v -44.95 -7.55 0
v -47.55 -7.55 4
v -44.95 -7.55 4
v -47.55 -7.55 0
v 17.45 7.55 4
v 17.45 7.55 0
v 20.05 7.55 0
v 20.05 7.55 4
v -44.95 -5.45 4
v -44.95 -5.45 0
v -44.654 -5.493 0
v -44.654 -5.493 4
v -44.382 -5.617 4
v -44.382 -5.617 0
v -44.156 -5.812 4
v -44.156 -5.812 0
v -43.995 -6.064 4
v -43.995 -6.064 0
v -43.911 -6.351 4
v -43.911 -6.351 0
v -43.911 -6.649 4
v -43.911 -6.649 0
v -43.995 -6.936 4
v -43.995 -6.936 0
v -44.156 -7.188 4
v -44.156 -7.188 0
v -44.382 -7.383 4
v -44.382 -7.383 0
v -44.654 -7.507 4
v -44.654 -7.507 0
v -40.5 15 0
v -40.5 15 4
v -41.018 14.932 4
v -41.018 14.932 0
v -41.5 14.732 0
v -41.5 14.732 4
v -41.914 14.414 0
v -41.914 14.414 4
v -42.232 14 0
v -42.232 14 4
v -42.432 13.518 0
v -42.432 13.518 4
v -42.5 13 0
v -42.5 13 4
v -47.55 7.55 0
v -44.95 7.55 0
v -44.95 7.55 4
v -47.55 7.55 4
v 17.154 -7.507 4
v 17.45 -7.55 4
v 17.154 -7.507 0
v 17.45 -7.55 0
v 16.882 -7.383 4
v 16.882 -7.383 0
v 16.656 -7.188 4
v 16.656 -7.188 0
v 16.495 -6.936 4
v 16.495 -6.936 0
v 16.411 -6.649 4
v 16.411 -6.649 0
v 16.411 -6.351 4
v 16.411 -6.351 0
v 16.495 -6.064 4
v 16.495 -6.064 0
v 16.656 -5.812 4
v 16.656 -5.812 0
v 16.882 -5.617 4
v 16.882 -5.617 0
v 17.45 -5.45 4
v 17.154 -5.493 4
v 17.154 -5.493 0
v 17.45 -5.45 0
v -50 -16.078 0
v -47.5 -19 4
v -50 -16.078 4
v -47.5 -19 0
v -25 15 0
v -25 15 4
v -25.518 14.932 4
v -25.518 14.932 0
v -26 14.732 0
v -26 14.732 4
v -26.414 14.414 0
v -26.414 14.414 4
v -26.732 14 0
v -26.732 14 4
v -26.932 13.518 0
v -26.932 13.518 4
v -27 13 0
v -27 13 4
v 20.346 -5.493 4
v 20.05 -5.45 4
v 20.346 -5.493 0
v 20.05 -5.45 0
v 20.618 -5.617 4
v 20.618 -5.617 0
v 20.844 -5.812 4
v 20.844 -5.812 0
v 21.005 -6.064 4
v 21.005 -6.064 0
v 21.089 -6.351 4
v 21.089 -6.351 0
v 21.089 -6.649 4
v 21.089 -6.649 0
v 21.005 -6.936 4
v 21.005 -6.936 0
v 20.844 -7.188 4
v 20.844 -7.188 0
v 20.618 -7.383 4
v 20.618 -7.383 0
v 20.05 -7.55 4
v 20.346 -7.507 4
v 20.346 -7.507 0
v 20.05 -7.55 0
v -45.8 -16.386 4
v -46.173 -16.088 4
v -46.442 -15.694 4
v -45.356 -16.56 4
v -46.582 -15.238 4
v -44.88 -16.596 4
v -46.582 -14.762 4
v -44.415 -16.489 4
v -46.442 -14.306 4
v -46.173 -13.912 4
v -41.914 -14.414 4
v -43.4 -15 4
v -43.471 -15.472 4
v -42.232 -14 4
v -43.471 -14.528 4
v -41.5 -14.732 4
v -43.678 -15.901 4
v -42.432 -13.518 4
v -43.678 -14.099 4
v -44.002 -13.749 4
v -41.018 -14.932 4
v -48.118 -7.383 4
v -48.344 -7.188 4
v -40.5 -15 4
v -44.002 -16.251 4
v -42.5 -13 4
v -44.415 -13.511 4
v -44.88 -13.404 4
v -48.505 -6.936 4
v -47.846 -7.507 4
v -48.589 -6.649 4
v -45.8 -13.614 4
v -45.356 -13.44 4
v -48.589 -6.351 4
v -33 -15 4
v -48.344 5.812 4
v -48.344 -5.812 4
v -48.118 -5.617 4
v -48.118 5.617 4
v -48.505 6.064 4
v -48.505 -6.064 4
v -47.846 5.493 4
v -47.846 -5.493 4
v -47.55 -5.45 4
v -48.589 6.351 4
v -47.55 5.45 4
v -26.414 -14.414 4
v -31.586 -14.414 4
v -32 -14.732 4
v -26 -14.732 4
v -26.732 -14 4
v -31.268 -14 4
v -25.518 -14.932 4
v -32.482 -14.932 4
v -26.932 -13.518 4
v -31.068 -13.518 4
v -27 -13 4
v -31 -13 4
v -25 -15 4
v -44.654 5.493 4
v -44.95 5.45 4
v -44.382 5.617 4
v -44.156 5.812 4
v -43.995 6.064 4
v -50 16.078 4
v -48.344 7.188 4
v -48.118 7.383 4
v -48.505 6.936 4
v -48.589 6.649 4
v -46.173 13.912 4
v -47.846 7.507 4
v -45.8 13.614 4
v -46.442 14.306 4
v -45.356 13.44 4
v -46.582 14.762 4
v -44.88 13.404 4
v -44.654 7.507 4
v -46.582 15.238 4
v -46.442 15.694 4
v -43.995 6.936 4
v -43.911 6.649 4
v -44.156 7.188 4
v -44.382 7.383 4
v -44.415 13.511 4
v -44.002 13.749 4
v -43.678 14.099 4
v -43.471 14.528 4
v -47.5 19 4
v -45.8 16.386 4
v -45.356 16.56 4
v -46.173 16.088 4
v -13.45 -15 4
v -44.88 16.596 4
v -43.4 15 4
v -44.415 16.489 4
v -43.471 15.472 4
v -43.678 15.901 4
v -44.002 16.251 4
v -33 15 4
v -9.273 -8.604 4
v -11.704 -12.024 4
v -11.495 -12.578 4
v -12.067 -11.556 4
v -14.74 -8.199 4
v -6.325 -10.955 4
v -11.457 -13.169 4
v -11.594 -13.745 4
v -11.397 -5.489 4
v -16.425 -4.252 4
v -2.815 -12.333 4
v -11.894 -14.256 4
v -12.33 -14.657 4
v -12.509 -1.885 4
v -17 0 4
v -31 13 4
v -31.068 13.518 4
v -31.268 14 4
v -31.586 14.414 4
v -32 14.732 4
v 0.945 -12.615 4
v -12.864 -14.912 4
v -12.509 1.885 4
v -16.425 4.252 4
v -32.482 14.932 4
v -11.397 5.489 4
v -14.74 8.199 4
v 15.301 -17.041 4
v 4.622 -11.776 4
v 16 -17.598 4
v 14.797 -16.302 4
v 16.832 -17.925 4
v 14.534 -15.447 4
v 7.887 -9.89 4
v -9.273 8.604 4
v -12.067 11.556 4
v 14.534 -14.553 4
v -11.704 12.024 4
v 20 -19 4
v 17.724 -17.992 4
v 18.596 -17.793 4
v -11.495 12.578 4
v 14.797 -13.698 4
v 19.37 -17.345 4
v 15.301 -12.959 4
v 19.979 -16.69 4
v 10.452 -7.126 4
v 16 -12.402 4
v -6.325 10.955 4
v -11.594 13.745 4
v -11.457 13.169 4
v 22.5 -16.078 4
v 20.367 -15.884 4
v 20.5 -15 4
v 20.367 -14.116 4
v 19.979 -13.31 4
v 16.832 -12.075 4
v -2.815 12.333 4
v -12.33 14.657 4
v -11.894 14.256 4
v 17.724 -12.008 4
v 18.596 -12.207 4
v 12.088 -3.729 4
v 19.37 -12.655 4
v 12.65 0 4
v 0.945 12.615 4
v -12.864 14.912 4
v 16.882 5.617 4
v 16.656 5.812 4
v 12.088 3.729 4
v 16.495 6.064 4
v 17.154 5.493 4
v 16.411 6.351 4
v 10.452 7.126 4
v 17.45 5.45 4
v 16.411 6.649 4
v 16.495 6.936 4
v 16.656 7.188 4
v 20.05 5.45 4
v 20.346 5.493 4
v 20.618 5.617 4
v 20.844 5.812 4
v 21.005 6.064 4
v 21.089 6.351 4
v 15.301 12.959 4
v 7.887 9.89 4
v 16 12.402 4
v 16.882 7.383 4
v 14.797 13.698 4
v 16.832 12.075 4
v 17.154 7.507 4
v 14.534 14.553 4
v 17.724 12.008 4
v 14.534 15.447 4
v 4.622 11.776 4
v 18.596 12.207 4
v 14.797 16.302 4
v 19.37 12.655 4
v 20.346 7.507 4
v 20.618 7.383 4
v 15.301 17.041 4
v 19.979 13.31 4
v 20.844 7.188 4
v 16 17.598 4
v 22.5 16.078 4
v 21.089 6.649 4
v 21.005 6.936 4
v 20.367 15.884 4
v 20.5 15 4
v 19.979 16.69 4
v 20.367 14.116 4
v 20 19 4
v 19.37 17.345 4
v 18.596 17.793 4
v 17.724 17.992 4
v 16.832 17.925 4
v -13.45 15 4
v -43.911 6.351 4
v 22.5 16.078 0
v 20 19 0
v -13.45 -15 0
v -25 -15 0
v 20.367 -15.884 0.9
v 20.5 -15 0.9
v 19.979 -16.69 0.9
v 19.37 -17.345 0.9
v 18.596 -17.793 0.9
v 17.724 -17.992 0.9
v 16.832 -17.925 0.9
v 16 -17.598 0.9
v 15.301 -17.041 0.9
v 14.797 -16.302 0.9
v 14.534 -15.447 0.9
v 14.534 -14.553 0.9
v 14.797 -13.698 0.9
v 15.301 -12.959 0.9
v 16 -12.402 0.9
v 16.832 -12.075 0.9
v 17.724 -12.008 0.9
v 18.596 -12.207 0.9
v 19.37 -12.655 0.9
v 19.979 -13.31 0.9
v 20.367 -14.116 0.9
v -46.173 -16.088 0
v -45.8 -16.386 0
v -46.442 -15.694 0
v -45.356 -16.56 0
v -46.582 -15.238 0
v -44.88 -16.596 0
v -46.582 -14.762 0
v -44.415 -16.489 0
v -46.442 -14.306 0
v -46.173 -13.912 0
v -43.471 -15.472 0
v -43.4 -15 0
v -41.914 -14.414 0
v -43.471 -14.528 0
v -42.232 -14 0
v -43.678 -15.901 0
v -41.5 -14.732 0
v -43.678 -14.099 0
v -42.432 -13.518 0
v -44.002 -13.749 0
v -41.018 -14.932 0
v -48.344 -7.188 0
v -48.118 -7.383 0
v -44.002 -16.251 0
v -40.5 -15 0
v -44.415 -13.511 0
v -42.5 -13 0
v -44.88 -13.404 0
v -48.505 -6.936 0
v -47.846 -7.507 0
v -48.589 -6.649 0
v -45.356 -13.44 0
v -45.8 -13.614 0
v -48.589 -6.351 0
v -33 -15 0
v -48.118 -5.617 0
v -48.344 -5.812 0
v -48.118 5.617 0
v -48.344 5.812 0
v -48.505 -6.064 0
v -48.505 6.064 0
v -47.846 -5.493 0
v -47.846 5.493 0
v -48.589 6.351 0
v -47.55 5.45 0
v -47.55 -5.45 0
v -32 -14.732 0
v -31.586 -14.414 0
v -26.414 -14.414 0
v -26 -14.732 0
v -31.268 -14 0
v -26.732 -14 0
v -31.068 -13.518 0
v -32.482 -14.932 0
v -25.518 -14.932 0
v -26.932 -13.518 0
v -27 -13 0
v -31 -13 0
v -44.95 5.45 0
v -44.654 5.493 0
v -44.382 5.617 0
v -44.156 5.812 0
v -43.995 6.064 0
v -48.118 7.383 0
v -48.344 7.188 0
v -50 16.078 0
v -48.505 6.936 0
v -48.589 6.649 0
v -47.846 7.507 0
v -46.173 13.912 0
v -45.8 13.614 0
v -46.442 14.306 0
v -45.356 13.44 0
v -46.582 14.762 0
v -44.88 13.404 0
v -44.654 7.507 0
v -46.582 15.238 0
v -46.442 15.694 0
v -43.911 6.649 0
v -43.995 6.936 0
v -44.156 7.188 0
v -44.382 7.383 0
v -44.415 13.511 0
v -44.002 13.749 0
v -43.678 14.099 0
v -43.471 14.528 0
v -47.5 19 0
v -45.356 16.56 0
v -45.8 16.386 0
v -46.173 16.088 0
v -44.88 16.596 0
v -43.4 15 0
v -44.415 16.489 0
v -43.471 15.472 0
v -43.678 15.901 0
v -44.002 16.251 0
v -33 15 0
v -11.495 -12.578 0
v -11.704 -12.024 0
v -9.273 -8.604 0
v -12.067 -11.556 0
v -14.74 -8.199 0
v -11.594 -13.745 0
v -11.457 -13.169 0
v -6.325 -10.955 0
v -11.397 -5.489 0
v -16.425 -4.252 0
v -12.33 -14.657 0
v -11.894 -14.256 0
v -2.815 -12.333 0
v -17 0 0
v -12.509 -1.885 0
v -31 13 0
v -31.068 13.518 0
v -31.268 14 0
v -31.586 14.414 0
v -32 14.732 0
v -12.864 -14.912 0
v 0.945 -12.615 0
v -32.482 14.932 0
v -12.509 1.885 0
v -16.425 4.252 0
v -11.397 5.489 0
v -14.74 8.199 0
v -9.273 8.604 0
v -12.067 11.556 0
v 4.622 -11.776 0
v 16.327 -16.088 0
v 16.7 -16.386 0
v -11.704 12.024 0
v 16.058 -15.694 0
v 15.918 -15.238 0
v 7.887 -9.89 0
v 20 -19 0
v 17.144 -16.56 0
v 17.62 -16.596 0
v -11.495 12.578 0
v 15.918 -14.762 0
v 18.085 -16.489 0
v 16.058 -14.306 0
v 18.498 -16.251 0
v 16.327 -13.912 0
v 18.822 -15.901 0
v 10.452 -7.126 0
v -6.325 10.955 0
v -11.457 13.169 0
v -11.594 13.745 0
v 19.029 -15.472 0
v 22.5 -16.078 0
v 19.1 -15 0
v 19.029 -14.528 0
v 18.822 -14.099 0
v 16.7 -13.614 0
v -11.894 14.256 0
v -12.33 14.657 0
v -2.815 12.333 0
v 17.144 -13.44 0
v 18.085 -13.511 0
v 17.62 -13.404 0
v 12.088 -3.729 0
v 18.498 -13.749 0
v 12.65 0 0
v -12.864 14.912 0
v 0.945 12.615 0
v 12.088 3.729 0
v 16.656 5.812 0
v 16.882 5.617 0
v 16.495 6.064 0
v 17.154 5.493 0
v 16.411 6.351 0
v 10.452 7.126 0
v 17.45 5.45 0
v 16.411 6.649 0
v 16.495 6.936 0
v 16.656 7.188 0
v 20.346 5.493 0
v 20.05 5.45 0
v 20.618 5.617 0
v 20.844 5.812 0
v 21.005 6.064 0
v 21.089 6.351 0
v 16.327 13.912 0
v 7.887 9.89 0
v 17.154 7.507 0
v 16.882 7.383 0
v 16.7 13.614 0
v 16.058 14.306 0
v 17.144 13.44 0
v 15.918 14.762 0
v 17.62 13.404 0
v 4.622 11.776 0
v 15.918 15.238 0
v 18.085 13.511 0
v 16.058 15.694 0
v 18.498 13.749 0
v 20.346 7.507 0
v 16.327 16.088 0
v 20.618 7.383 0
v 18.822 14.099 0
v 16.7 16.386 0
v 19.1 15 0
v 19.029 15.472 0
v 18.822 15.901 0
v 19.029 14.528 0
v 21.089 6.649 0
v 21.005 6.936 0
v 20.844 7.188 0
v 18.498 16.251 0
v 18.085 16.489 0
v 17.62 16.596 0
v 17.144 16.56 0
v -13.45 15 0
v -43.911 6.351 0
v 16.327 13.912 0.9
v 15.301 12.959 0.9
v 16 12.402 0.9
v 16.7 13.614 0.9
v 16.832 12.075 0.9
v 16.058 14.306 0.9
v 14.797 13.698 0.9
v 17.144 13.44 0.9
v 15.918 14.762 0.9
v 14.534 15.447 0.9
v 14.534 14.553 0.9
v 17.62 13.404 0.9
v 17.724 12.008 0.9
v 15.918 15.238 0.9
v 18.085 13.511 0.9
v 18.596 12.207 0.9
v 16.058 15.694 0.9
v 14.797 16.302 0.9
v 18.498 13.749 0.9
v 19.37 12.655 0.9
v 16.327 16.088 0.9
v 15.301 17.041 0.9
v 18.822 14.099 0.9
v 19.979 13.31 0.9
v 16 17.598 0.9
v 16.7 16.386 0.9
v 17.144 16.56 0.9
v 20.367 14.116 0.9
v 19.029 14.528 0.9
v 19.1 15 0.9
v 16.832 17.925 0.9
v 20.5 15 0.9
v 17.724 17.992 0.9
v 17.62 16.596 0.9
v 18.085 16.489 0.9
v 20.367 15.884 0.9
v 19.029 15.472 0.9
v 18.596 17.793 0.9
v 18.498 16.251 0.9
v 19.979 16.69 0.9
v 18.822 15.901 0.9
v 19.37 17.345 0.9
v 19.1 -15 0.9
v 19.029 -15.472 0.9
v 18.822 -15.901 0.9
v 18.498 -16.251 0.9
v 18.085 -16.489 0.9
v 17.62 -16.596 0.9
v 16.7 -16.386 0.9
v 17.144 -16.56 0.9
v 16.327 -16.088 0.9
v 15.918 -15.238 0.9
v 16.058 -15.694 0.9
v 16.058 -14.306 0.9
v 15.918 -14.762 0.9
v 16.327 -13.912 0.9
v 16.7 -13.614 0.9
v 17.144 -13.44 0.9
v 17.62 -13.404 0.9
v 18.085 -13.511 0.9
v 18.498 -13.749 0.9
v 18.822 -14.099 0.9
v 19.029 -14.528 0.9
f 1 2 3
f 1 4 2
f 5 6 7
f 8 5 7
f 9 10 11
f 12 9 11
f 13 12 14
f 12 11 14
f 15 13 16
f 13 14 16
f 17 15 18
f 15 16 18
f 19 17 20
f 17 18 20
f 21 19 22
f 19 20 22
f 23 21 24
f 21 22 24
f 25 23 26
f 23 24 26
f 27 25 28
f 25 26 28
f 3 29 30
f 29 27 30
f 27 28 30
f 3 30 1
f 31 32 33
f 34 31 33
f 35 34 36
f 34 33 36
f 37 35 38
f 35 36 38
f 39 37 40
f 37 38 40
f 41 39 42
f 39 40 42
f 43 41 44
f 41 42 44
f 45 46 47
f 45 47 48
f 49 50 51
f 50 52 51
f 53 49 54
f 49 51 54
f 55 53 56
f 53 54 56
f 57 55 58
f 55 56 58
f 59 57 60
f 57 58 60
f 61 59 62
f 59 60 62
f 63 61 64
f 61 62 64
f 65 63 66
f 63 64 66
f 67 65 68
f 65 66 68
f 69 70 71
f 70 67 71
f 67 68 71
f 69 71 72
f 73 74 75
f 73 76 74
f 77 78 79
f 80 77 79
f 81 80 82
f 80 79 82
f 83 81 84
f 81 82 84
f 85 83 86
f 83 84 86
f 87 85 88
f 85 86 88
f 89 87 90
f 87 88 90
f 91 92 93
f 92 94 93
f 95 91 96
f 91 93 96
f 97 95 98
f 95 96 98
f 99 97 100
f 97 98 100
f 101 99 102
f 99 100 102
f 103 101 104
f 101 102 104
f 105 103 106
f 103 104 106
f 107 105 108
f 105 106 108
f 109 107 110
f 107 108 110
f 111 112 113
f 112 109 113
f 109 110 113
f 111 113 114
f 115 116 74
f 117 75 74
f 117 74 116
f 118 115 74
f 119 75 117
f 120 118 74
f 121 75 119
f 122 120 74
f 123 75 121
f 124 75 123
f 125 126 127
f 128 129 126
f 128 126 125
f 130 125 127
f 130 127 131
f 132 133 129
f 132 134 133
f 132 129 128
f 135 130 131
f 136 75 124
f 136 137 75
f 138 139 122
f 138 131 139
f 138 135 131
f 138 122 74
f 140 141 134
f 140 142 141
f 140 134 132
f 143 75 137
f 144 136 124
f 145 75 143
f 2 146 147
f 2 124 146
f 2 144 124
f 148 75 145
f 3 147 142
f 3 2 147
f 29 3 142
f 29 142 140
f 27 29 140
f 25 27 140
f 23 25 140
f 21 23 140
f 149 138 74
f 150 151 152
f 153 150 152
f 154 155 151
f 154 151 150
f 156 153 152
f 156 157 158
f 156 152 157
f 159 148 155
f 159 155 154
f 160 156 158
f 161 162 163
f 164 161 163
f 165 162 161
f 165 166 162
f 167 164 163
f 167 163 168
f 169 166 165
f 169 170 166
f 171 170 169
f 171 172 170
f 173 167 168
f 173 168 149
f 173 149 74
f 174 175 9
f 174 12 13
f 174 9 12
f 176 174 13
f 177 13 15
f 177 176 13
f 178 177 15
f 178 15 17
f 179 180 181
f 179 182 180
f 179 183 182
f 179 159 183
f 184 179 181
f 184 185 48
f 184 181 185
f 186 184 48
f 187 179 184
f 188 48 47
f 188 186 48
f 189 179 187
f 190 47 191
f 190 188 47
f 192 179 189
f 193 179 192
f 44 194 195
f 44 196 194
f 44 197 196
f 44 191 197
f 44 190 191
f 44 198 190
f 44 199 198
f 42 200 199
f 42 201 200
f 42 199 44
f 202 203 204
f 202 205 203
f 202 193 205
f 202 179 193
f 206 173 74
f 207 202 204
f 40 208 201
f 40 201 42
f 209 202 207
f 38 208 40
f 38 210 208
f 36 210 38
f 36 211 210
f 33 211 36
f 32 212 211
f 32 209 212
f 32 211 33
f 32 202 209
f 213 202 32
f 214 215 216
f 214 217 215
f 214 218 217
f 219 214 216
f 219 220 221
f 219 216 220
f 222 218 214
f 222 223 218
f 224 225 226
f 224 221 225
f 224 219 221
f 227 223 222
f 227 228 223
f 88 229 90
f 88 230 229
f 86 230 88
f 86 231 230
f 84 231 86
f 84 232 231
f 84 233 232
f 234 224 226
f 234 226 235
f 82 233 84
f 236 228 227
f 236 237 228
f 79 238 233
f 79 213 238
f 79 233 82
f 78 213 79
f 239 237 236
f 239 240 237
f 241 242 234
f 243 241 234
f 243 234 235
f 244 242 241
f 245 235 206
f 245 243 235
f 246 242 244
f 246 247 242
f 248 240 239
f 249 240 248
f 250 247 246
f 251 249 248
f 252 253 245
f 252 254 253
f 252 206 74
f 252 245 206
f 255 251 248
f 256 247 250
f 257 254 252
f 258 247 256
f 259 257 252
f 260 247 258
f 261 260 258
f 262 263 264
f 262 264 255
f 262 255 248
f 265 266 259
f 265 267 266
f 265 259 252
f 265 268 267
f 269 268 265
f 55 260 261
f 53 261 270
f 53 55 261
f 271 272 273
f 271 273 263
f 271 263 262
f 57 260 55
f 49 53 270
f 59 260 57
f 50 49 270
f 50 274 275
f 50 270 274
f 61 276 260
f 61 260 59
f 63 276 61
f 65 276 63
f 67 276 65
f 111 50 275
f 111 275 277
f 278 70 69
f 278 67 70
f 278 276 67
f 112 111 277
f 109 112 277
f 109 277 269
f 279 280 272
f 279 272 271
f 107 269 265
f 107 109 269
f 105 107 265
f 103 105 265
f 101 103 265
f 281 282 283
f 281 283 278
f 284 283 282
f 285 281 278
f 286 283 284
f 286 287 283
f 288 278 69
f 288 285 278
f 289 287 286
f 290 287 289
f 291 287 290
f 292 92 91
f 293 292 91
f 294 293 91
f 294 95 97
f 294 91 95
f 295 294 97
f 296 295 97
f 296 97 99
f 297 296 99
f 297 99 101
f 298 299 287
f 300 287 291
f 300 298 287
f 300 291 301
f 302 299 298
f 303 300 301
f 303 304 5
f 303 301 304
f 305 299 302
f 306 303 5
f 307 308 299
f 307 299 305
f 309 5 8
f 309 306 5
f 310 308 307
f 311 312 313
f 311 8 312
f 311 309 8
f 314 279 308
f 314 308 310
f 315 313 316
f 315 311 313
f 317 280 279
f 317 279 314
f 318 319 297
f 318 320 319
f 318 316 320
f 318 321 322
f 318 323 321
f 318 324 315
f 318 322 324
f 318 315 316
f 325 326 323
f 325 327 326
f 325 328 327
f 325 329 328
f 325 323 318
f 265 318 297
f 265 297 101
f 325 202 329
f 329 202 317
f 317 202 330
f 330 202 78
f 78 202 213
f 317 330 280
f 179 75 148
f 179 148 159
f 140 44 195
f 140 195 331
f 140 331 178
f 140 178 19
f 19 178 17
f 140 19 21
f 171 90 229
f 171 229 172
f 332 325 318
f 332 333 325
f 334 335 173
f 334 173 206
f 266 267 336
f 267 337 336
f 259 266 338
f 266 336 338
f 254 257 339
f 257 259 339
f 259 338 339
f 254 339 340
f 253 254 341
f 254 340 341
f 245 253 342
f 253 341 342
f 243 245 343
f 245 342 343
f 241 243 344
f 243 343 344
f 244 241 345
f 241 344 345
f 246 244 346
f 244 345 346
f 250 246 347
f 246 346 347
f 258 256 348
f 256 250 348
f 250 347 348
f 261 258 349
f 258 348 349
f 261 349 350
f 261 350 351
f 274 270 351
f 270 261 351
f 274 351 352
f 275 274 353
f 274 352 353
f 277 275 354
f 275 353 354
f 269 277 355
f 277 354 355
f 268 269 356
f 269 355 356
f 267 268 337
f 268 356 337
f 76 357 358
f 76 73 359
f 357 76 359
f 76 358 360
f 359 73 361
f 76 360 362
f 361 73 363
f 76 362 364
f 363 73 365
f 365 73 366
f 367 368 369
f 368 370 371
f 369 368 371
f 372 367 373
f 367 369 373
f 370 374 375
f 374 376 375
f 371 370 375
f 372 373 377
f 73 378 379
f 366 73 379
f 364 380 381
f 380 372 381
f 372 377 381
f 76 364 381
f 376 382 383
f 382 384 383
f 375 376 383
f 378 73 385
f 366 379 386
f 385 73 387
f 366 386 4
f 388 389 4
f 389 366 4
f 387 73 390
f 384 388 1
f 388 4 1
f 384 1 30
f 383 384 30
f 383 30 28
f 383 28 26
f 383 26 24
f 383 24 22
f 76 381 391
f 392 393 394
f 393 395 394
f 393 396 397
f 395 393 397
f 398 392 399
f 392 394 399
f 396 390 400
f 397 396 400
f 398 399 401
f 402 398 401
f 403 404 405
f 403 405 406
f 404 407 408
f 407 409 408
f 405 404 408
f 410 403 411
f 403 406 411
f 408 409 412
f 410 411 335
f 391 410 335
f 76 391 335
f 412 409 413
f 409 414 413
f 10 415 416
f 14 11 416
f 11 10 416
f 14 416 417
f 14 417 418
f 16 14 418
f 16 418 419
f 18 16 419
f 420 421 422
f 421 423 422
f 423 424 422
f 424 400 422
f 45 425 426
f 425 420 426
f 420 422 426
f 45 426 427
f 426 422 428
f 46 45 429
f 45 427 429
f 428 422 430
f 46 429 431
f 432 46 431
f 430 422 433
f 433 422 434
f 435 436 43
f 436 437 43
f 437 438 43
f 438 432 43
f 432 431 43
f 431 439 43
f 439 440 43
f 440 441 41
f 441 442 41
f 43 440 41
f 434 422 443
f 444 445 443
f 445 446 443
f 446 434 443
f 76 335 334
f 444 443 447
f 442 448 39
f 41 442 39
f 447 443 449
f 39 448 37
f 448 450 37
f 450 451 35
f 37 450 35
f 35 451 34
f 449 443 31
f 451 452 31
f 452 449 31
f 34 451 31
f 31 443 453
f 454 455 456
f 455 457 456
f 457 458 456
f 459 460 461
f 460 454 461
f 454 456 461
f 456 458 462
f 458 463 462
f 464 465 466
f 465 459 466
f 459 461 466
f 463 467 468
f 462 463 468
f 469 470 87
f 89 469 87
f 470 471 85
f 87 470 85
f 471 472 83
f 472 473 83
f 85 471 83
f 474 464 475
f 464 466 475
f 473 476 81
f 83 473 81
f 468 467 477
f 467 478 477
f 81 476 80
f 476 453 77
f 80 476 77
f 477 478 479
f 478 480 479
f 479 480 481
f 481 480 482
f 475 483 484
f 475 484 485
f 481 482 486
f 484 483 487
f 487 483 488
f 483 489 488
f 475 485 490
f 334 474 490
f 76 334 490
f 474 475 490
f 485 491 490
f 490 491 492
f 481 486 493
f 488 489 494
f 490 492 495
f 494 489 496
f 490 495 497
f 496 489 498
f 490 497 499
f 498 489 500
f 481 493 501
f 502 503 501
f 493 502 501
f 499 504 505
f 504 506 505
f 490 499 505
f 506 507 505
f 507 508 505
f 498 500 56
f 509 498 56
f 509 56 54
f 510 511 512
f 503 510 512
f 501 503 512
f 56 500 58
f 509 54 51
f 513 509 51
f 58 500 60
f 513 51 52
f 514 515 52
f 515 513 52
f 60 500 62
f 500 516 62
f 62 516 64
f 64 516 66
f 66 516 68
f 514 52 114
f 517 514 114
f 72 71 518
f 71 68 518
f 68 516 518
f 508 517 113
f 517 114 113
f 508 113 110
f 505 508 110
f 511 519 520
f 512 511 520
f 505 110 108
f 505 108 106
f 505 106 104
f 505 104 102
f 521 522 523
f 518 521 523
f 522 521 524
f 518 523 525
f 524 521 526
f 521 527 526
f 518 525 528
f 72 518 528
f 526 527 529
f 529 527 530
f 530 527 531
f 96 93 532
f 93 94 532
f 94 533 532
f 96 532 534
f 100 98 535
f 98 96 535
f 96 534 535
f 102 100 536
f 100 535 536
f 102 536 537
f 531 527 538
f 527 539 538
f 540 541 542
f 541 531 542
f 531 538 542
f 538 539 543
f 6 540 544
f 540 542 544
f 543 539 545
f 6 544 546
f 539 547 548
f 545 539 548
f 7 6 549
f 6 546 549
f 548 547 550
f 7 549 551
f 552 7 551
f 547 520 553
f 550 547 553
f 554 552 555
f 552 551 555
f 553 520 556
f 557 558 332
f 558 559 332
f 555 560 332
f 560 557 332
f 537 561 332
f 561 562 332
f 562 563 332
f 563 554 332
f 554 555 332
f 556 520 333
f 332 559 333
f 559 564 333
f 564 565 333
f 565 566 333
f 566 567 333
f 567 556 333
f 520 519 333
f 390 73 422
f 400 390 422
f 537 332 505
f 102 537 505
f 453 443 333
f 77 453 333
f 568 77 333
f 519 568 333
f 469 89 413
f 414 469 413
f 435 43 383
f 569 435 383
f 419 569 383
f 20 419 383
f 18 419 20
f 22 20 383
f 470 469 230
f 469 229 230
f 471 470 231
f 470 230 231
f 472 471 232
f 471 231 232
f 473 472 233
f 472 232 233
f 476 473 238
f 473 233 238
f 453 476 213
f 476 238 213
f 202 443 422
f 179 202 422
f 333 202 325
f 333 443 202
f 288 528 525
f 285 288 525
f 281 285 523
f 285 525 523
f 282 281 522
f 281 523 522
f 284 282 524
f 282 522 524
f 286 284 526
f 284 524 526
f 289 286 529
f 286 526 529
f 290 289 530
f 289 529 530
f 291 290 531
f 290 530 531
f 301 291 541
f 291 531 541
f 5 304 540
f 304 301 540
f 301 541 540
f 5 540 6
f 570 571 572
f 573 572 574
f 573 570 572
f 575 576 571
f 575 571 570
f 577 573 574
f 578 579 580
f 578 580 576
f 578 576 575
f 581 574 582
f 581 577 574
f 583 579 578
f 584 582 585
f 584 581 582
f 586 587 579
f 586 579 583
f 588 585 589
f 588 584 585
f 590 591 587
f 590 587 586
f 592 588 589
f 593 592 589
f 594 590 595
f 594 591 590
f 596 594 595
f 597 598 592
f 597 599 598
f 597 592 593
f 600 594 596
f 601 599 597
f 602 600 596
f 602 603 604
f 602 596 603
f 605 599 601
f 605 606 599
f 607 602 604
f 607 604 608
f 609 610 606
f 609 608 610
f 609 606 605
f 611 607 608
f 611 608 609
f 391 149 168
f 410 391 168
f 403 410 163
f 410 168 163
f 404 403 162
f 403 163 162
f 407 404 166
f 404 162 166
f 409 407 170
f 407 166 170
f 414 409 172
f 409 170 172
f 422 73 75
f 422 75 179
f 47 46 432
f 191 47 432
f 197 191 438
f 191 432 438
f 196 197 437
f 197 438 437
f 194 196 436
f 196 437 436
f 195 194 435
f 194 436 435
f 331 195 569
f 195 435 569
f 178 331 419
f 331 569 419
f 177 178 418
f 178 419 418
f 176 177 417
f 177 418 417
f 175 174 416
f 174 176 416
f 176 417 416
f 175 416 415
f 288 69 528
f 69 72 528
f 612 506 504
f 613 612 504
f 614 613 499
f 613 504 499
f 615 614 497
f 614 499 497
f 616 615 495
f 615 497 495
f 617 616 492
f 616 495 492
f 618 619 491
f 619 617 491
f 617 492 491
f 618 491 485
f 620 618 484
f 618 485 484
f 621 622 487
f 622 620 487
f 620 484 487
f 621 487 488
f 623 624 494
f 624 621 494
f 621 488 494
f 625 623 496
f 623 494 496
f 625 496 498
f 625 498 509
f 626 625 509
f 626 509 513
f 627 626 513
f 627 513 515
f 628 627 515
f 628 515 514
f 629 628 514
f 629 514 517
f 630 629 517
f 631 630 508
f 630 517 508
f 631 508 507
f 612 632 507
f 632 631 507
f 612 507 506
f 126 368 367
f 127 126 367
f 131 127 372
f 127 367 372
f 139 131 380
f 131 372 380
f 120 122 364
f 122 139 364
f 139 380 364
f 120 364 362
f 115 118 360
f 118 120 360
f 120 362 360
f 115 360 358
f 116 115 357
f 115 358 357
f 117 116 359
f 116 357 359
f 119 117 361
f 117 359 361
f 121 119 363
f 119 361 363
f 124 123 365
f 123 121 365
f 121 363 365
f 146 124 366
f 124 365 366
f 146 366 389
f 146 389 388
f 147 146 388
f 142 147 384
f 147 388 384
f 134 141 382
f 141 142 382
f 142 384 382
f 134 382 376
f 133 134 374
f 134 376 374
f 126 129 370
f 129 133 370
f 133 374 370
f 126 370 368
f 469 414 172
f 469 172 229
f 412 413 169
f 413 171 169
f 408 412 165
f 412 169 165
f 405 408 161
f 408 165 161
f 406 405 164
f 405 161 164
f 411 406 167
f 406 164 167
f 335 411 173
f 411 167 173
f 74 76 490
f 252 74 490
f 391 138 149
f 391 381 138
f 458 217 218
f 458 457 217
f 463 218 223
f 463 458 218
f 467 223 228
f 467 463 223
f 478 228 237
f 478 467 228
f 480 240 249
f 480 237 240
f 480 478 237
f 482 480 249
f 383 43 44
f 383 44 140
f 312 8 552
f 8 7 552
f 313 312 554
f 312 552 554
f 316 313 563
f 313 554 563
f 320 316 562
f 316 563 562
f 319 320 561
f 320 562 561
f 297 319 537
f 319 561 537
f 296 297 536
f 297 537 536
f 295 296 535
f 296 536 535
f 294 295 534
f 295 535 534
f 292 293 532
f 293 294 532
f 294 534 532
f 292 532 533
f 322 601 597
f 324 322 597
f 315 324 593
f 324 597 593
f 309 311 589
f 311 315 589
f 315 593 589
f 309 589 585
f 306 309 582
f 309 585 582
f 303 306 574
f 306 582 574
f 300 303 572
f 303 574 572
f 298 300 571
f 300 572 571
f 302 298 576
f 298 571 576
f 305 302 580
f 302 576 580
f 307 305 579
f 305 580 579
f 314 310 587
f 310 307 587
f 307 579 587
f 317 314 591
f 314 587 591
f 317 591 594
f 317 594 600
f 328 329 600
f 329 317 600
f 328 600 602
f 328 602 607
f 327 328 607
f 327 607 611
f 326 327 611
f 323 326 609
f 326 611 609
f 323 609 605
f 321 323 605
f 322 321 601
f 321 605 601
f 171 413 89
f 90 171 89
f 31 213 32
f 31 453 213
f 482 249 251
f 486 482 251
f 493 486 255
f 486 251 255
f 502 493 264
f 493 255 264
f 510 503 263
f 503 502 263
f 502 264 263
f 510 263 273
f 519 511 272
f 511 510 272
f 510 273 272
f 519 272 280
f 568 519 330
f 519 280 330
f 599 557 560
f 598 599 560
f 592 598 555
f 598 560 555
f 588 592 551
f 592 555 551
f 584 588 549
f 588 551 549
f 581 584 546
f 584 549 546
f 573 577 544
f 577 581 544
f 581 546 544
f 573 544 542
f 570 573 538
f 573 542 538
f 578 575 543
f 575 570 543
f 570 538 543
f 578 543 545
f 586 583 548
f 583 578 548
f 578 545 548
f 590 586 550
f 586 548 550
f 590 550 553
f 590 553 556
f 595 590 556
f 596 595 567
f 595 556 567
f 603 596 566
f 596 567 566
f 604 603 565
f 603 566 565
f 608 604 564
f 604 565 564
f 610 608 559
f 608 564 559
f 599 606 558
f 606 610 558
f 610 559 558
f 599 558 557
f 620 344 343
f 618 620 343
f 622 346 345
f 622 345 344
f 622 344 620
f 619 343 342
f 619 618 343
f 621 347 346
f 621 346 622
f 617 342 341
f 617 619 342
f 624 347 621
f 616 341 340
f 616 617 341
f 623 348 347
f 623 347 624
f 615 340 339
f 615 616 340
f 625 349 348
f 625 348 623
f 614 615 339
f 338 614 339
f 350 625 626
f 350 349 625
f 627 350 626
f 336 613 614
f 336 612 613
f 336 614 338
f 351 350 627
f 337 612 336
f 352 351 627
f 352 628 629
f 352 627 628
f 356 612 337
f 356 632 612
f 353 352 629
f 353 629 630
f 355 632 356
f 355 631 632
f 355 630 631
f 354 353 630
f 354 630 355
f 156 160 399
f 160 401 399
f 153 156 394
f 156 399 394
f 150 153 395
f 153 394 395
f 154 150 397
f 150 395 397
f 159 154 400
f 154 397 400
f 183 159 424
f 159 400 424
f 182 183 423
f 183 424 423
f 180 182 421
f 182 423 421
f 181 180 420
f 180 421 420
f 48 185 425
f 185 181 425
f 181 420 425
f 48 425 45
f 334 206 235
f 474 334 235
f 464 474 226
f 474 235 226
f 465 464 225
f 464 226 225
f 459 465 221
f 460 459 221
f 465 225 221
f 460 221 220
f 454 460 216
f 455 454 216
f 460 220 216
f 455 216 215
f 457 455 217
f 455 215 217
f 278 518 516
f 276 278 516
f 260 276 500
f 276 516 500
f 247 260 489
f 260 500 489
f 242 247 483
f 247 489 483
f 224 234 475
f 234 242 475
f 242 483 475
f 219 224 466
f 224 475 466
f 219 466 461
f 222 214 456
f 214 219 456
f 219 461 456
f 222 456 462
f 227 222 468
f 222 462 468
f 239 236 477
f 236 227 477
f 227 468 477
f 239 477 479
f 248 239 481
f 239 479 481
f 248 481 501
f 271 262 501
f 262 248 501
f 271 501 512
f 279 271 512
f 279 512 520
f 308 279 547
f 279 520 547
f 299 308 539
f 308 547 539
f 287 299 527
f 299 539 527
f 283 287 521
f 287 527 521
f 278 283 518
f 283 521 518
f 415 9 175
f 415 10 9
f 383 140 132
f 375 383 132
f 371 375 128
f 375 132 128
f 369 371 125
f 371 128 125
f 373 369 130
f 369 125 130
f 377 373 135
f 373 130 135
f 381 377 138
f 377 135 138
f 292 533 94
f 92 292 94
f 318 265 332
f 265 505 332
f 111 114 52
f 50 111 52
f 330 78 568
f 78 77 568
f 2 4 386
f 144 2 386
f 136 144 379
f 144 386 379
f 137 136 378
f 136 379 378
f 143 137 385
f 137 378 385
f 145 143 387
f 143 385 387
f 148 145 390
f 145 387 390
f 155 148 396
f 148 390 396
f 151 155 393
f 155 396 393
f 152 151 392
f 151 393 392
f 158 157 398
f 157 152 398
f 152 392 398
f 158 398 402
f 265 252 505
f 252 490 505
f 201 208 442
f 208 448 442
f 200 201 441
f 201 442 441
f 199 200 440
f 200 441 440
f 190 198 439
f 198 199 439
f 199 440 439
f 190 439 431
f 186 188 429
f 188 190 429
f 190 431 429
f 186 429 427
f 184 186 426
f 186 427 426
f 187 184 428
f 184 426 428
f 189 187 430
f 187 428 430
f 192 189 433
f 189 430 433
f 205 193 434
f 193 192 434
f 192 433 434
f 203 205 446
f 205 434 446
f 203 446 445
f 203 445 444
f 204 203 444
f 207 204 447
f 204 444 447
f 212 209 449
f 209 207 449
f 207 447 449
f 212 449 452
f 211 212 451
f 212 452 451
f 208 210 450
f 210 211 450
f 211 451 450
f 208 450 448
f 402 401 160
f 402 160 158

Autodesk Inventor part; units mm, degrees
ref_plane "YZ Plane" through (0, 0, 0) normal (1, 0, 0) x (0, 1, 0)
ref_plane "XZ Plane" through (0, 0, 0) normal (0, 1, 0) x (-1, 0, 0)
ref_plane "XY Plane" through (0, 0, 0) normal (0, 0, 1) x (1, 0, 0)
sketch "スケッチ1" plane through (0, 0, 0) normal (0, 0, 1) x (1, 0, 0)
  circle A0 centre (0, 0) radius 10.5 construction
  line L0 (-28, -13.5) -> (-1, -13.5) construction
  line L1 (-1, -13.5) -> (-1, 13.5) construction
  line L2 (-1, 13.5) -> (-28, 13.5) construction
  line L3 (-28, 13.5) -> (-28, -13.5) construction
  line L4 (-28, -13.5) -> (-1, 13.5) construction
  line L5 (-1, -13.5) -> (-28, 13.5) construction
  line L6 (-31, -16) -> (12, -16) construction
  line L7 (12, -16) -> (12, 16) construction
  line L8 (12, 16) -> (-31, 16) construction
  line L9 (-31, 16) -> (-31, -16) construction
  line L10 (-31, -16) -> (12, 16) construction
  line L11 (12, -16) -> (-31, 16) construction
  line L12 (-31, -14.4) -> (-39.5, -14.4) construction
  line L13 (-39.5, -14.4) -> (-39.5, 14.4) construction
  line L14 (-39.5, 0) -> (12, 0) construction
  line L15 (-31, 14.4) -> (-39.5, 14.4) construction
  line L16 (-14.5, -13.5) -> (-14.5, 13.5) construction
  line L17 (17.5, -7.5) -> (20, -7.5) construction
  line L18 (20, -7.5) -> (20, 7.5) construction
  line L19 (20, 7.5) -> (17.5, 7.5) construction
  line L20 (17.5, 7.5) -> (17.5, -7.5) construction
  line L21 (17.5, -7.5) -> (20, 7.5) construction
  line L22 (20, -7.5) -> (17.5, 7.5) construction
  line L23 (17.45, 7.55) -> (20.05, 7.55)
  line L24 (20.05, 5.45) -> (20.05, -5.45)
  line L25 (20.05, -7.55) -> (17.45, -7.55)
  line L26 (17.45, -5.45) -> (17.45, 5.45)
  line L27 (17.45, 7.55) -> (20.05, -7.55) construction
  line L28 (20.05, 7.55) -> (17.45, -7.55) construction
  arc A1 (17.45, -5.45) -> (17.45, -7.55) centre (17.45, -6.5) ccw
  line L29 (18.75, -7.5) -> (18.75, 7.5) construction
  arc A2 (17.45, 7.55) -> (17.45, 5.45) centre (17.45, 6.5) ccw
  arc A3 (20.05, -7.55) -> (20.05, -5.45) centre (20.05, -6.5) ccw
  arc A4 (20.05, 5.45) -> (20.05, 7.55) centre (20.05, 6.5) ccw
  line L30 (-13.75, -16) -> (-13.75, 16) construction
  line L31 (-45, -7.5) -> (-47.5, -7.5) construction
  line L32 (-47.5, -7.5) -> (-47.5, 7.5) construction
  line L33 (-47.5, 7.5) -> (-45, 7.5) construction
  line L34 (-45, 7.5) -> (-45, -7.5) construction
  line L35 (-45, -7.5) -> (-47.5, 7.5) construction
  line L36 (-47.5, -7.5) -> (-45, 7.5) construction
  line L37 (-44.95, 7.55) -> (-47.55, 7.55)
  line L38 (-47.55, 5.45) -> (-47.55, -5.45)
  line L39 (-47.55, -7.55) -> (-44.95, -7.55)
  line L40 (-44.95, -5.45) -> (-44.95, 5.45)
  line L41 (-44.95, 7.55) -> (-47.55, -7.55) construction
  line L42 (-47.55, 7.55) -> (-44.95, -7.55) construction
  arc A5 (-44.95, -7.55) -> (-44.95, -5.45) centre (-44.95, -6.5) ccw
  line L43 (-46.25, -7.5) -> (-46.25, 7.5) construction
  arc A6 (-44.95, 5.45) -> (-44.95, 7.55) centre (-44.95, 6.5) ccw
  arc A7 (-47.55, -5.45) -> (-47.55, -7.55) centre (-47.55, -6.5) ccw
  arc A8 (-47.55, 7.55) -> (-47.55, 5.45) centre (-47.55, 6.5) ccw
  circle A9 centre (17.5, -15) radius 1.6
  circle A10 centre (17.5, 15) radius 1.6
  circle A11 centre (-45, -15) radius 1.6
  circle A12 centre (-45, 15) radius 1.6
  line L44 (15, -60.5) -> (20, -60.5) construction
  line L45 (20, -60.5) -> (20, 60.5) construction
  line L46 (20, 60.5) -> (15, 60.5) construction
  line L47 (15, -60.5) -> (20, 60.5) construction
  line L48 (20, -60.5) -> (15, 60.5) construction
  arc A13 (-6.5678, 15) -> (-6.5678, -15) centre (-1, 0) ccw
  line L49 (-3.65, -16) -> (1.65, -16) construction
  line L50 (1.65, -16) -> (1.65, 16) construction
  line L51 (1.65, 16) -> (-3.65, 16) construction
  line L52 (-3.65, 16) -> (-3.65, -16) construction
  line L53 (-3.65, -16) -> (1.65, 16) construction
  line L54 (1.65, -16) -> (-3.65, 16) construction
  line L55 (-42.5, -60.5) -> (-47.5, -60.5) construction
  line L56 (-47.5, -60.5) -> (-47.5, 60.5) construction
  line L57 (-47.5, 60.5) -> (-42.5, 60.5) construction
  line L58 (-42.5, 60.5) -> (-42.5, -60.5) construction
  circle A14 centre (17.5, -15) radius 3
  circle A15 centre (17.5, 15) radius 3
  line L59 (-27, -15) -> (-6.5678, -15)
  line L60 (-42.5, -15) -> (-31, -15)
  line L61 (-31, -15) -> (-31, 15)
  line L62 (-31, 15) -> (-42.5, 15)
  line L63 (-42.5, 15) -> (-42.5, -15)
  line L64 (-42.5, -15) -> (-31, 15) construction
  line L65 (-31, -15) -> (-42.5, 15) construction
  line L66 (-47.5, -19) -> (20, -19)
  line L67 (-27, -15) -> (-27, 15)
  line L68 (-47.5, 19) -> (20, 19)
  line L69 (20, -19) -> (22.5, -16.0779)
  line L70 (22.5, -16.0779) -> (22.5, 16.0779)
  line L71 (20, 19) -> (22.5, 16.0779)
  line L72 (-47.5, -19) -> (-50, -16.0779)
  line L73 (-50, -16.0779) -> (-50, 16.0779)
  line L74 (-47.5, 19) -> (-50, 16.0779)
  line L75 (-27, 15) -> (-6.5678, 15)
  line L76 (15, 60.5) -> (15, -60.5) construction
  circle A16 centre (0, 0) radius 12.65
  point P0 (-14.5, 0)
  point P1 (-9.5, 0)
  point P2 (-14.5, 0)
  point P3 (18.75, 0)
  point P4 (18.75, 0)
  point P5 (18.75, 0)
  point P6 (18.75, 0)
  point P7 (-46.25, 0)
  point P8 (-46.25, 0)
  point P9 (-46.25, 0)
  point P10 (-46.25, 0)
  point P11 (17.5, 0)
  point P12 (17.5, 0)
  point P13 (-1, 0)
  point P14 (-36.75, 0)
  point P15 (-1, 0)
  dimension "d0" = 21
  dimension "d1" = 27
  dimension "d2" = 27
  dimension "d3" = 43
  dimension "d4" = 32
  dimension "d5" = 28.8
  dimension "d6" = 8.5
  dimension "d7" = 9.5
  dimension "d11" = 8.5
  dimension "d13" = 2.5
  dimension "d14" = 15
  dimension "d15" = 1.05
  dimension "d16" = 0.05
  dimension "d17" = 0.05
  dimension "d28" = 3.2
  dimension "d31" = 5
  dimension "d32" = 121
  dimension "d36" = 5.3
  dimension "d55" = 16
  dimension "d71" = 6
  dimension "d83" = 30
  dimension "d84" = 2.5
  dimension "d97" = 1.5
  dimension "d98" = 2.5
  dimension "d102" = 38
  dimension "d103" = 4
  dimension "d104" = 4
  dimension "d106" = 2.5
  dimension "d107" = 2.5
  dimension "d108" = 3
  dimension "d109" = 57.5
  dimension "d113" = 25.3
extrude "押し出し1" add sketch "スケッチ1" along normal blind 4 contours L72 L73 L74 L68 L71 L70 L69 L66
extrude "押し出し3" add sketch "スケッチ1" along normal blind 0.9 contours A14 | A15
fillet "フィレット1" radius 2 8 edges at (-31, -15, 2) (-42.5, -15, 2) (-42.5, 15, 2) (-31, 15, 2) (-6.5678, -15, 2) (-6.5678, 15, 2) (-27, 15, 2) (-27, -15, 2)
equation "\"d17\" = d16"
properties part number "Trunk_neck_frame" material "アルミニウム 2014-T4"
